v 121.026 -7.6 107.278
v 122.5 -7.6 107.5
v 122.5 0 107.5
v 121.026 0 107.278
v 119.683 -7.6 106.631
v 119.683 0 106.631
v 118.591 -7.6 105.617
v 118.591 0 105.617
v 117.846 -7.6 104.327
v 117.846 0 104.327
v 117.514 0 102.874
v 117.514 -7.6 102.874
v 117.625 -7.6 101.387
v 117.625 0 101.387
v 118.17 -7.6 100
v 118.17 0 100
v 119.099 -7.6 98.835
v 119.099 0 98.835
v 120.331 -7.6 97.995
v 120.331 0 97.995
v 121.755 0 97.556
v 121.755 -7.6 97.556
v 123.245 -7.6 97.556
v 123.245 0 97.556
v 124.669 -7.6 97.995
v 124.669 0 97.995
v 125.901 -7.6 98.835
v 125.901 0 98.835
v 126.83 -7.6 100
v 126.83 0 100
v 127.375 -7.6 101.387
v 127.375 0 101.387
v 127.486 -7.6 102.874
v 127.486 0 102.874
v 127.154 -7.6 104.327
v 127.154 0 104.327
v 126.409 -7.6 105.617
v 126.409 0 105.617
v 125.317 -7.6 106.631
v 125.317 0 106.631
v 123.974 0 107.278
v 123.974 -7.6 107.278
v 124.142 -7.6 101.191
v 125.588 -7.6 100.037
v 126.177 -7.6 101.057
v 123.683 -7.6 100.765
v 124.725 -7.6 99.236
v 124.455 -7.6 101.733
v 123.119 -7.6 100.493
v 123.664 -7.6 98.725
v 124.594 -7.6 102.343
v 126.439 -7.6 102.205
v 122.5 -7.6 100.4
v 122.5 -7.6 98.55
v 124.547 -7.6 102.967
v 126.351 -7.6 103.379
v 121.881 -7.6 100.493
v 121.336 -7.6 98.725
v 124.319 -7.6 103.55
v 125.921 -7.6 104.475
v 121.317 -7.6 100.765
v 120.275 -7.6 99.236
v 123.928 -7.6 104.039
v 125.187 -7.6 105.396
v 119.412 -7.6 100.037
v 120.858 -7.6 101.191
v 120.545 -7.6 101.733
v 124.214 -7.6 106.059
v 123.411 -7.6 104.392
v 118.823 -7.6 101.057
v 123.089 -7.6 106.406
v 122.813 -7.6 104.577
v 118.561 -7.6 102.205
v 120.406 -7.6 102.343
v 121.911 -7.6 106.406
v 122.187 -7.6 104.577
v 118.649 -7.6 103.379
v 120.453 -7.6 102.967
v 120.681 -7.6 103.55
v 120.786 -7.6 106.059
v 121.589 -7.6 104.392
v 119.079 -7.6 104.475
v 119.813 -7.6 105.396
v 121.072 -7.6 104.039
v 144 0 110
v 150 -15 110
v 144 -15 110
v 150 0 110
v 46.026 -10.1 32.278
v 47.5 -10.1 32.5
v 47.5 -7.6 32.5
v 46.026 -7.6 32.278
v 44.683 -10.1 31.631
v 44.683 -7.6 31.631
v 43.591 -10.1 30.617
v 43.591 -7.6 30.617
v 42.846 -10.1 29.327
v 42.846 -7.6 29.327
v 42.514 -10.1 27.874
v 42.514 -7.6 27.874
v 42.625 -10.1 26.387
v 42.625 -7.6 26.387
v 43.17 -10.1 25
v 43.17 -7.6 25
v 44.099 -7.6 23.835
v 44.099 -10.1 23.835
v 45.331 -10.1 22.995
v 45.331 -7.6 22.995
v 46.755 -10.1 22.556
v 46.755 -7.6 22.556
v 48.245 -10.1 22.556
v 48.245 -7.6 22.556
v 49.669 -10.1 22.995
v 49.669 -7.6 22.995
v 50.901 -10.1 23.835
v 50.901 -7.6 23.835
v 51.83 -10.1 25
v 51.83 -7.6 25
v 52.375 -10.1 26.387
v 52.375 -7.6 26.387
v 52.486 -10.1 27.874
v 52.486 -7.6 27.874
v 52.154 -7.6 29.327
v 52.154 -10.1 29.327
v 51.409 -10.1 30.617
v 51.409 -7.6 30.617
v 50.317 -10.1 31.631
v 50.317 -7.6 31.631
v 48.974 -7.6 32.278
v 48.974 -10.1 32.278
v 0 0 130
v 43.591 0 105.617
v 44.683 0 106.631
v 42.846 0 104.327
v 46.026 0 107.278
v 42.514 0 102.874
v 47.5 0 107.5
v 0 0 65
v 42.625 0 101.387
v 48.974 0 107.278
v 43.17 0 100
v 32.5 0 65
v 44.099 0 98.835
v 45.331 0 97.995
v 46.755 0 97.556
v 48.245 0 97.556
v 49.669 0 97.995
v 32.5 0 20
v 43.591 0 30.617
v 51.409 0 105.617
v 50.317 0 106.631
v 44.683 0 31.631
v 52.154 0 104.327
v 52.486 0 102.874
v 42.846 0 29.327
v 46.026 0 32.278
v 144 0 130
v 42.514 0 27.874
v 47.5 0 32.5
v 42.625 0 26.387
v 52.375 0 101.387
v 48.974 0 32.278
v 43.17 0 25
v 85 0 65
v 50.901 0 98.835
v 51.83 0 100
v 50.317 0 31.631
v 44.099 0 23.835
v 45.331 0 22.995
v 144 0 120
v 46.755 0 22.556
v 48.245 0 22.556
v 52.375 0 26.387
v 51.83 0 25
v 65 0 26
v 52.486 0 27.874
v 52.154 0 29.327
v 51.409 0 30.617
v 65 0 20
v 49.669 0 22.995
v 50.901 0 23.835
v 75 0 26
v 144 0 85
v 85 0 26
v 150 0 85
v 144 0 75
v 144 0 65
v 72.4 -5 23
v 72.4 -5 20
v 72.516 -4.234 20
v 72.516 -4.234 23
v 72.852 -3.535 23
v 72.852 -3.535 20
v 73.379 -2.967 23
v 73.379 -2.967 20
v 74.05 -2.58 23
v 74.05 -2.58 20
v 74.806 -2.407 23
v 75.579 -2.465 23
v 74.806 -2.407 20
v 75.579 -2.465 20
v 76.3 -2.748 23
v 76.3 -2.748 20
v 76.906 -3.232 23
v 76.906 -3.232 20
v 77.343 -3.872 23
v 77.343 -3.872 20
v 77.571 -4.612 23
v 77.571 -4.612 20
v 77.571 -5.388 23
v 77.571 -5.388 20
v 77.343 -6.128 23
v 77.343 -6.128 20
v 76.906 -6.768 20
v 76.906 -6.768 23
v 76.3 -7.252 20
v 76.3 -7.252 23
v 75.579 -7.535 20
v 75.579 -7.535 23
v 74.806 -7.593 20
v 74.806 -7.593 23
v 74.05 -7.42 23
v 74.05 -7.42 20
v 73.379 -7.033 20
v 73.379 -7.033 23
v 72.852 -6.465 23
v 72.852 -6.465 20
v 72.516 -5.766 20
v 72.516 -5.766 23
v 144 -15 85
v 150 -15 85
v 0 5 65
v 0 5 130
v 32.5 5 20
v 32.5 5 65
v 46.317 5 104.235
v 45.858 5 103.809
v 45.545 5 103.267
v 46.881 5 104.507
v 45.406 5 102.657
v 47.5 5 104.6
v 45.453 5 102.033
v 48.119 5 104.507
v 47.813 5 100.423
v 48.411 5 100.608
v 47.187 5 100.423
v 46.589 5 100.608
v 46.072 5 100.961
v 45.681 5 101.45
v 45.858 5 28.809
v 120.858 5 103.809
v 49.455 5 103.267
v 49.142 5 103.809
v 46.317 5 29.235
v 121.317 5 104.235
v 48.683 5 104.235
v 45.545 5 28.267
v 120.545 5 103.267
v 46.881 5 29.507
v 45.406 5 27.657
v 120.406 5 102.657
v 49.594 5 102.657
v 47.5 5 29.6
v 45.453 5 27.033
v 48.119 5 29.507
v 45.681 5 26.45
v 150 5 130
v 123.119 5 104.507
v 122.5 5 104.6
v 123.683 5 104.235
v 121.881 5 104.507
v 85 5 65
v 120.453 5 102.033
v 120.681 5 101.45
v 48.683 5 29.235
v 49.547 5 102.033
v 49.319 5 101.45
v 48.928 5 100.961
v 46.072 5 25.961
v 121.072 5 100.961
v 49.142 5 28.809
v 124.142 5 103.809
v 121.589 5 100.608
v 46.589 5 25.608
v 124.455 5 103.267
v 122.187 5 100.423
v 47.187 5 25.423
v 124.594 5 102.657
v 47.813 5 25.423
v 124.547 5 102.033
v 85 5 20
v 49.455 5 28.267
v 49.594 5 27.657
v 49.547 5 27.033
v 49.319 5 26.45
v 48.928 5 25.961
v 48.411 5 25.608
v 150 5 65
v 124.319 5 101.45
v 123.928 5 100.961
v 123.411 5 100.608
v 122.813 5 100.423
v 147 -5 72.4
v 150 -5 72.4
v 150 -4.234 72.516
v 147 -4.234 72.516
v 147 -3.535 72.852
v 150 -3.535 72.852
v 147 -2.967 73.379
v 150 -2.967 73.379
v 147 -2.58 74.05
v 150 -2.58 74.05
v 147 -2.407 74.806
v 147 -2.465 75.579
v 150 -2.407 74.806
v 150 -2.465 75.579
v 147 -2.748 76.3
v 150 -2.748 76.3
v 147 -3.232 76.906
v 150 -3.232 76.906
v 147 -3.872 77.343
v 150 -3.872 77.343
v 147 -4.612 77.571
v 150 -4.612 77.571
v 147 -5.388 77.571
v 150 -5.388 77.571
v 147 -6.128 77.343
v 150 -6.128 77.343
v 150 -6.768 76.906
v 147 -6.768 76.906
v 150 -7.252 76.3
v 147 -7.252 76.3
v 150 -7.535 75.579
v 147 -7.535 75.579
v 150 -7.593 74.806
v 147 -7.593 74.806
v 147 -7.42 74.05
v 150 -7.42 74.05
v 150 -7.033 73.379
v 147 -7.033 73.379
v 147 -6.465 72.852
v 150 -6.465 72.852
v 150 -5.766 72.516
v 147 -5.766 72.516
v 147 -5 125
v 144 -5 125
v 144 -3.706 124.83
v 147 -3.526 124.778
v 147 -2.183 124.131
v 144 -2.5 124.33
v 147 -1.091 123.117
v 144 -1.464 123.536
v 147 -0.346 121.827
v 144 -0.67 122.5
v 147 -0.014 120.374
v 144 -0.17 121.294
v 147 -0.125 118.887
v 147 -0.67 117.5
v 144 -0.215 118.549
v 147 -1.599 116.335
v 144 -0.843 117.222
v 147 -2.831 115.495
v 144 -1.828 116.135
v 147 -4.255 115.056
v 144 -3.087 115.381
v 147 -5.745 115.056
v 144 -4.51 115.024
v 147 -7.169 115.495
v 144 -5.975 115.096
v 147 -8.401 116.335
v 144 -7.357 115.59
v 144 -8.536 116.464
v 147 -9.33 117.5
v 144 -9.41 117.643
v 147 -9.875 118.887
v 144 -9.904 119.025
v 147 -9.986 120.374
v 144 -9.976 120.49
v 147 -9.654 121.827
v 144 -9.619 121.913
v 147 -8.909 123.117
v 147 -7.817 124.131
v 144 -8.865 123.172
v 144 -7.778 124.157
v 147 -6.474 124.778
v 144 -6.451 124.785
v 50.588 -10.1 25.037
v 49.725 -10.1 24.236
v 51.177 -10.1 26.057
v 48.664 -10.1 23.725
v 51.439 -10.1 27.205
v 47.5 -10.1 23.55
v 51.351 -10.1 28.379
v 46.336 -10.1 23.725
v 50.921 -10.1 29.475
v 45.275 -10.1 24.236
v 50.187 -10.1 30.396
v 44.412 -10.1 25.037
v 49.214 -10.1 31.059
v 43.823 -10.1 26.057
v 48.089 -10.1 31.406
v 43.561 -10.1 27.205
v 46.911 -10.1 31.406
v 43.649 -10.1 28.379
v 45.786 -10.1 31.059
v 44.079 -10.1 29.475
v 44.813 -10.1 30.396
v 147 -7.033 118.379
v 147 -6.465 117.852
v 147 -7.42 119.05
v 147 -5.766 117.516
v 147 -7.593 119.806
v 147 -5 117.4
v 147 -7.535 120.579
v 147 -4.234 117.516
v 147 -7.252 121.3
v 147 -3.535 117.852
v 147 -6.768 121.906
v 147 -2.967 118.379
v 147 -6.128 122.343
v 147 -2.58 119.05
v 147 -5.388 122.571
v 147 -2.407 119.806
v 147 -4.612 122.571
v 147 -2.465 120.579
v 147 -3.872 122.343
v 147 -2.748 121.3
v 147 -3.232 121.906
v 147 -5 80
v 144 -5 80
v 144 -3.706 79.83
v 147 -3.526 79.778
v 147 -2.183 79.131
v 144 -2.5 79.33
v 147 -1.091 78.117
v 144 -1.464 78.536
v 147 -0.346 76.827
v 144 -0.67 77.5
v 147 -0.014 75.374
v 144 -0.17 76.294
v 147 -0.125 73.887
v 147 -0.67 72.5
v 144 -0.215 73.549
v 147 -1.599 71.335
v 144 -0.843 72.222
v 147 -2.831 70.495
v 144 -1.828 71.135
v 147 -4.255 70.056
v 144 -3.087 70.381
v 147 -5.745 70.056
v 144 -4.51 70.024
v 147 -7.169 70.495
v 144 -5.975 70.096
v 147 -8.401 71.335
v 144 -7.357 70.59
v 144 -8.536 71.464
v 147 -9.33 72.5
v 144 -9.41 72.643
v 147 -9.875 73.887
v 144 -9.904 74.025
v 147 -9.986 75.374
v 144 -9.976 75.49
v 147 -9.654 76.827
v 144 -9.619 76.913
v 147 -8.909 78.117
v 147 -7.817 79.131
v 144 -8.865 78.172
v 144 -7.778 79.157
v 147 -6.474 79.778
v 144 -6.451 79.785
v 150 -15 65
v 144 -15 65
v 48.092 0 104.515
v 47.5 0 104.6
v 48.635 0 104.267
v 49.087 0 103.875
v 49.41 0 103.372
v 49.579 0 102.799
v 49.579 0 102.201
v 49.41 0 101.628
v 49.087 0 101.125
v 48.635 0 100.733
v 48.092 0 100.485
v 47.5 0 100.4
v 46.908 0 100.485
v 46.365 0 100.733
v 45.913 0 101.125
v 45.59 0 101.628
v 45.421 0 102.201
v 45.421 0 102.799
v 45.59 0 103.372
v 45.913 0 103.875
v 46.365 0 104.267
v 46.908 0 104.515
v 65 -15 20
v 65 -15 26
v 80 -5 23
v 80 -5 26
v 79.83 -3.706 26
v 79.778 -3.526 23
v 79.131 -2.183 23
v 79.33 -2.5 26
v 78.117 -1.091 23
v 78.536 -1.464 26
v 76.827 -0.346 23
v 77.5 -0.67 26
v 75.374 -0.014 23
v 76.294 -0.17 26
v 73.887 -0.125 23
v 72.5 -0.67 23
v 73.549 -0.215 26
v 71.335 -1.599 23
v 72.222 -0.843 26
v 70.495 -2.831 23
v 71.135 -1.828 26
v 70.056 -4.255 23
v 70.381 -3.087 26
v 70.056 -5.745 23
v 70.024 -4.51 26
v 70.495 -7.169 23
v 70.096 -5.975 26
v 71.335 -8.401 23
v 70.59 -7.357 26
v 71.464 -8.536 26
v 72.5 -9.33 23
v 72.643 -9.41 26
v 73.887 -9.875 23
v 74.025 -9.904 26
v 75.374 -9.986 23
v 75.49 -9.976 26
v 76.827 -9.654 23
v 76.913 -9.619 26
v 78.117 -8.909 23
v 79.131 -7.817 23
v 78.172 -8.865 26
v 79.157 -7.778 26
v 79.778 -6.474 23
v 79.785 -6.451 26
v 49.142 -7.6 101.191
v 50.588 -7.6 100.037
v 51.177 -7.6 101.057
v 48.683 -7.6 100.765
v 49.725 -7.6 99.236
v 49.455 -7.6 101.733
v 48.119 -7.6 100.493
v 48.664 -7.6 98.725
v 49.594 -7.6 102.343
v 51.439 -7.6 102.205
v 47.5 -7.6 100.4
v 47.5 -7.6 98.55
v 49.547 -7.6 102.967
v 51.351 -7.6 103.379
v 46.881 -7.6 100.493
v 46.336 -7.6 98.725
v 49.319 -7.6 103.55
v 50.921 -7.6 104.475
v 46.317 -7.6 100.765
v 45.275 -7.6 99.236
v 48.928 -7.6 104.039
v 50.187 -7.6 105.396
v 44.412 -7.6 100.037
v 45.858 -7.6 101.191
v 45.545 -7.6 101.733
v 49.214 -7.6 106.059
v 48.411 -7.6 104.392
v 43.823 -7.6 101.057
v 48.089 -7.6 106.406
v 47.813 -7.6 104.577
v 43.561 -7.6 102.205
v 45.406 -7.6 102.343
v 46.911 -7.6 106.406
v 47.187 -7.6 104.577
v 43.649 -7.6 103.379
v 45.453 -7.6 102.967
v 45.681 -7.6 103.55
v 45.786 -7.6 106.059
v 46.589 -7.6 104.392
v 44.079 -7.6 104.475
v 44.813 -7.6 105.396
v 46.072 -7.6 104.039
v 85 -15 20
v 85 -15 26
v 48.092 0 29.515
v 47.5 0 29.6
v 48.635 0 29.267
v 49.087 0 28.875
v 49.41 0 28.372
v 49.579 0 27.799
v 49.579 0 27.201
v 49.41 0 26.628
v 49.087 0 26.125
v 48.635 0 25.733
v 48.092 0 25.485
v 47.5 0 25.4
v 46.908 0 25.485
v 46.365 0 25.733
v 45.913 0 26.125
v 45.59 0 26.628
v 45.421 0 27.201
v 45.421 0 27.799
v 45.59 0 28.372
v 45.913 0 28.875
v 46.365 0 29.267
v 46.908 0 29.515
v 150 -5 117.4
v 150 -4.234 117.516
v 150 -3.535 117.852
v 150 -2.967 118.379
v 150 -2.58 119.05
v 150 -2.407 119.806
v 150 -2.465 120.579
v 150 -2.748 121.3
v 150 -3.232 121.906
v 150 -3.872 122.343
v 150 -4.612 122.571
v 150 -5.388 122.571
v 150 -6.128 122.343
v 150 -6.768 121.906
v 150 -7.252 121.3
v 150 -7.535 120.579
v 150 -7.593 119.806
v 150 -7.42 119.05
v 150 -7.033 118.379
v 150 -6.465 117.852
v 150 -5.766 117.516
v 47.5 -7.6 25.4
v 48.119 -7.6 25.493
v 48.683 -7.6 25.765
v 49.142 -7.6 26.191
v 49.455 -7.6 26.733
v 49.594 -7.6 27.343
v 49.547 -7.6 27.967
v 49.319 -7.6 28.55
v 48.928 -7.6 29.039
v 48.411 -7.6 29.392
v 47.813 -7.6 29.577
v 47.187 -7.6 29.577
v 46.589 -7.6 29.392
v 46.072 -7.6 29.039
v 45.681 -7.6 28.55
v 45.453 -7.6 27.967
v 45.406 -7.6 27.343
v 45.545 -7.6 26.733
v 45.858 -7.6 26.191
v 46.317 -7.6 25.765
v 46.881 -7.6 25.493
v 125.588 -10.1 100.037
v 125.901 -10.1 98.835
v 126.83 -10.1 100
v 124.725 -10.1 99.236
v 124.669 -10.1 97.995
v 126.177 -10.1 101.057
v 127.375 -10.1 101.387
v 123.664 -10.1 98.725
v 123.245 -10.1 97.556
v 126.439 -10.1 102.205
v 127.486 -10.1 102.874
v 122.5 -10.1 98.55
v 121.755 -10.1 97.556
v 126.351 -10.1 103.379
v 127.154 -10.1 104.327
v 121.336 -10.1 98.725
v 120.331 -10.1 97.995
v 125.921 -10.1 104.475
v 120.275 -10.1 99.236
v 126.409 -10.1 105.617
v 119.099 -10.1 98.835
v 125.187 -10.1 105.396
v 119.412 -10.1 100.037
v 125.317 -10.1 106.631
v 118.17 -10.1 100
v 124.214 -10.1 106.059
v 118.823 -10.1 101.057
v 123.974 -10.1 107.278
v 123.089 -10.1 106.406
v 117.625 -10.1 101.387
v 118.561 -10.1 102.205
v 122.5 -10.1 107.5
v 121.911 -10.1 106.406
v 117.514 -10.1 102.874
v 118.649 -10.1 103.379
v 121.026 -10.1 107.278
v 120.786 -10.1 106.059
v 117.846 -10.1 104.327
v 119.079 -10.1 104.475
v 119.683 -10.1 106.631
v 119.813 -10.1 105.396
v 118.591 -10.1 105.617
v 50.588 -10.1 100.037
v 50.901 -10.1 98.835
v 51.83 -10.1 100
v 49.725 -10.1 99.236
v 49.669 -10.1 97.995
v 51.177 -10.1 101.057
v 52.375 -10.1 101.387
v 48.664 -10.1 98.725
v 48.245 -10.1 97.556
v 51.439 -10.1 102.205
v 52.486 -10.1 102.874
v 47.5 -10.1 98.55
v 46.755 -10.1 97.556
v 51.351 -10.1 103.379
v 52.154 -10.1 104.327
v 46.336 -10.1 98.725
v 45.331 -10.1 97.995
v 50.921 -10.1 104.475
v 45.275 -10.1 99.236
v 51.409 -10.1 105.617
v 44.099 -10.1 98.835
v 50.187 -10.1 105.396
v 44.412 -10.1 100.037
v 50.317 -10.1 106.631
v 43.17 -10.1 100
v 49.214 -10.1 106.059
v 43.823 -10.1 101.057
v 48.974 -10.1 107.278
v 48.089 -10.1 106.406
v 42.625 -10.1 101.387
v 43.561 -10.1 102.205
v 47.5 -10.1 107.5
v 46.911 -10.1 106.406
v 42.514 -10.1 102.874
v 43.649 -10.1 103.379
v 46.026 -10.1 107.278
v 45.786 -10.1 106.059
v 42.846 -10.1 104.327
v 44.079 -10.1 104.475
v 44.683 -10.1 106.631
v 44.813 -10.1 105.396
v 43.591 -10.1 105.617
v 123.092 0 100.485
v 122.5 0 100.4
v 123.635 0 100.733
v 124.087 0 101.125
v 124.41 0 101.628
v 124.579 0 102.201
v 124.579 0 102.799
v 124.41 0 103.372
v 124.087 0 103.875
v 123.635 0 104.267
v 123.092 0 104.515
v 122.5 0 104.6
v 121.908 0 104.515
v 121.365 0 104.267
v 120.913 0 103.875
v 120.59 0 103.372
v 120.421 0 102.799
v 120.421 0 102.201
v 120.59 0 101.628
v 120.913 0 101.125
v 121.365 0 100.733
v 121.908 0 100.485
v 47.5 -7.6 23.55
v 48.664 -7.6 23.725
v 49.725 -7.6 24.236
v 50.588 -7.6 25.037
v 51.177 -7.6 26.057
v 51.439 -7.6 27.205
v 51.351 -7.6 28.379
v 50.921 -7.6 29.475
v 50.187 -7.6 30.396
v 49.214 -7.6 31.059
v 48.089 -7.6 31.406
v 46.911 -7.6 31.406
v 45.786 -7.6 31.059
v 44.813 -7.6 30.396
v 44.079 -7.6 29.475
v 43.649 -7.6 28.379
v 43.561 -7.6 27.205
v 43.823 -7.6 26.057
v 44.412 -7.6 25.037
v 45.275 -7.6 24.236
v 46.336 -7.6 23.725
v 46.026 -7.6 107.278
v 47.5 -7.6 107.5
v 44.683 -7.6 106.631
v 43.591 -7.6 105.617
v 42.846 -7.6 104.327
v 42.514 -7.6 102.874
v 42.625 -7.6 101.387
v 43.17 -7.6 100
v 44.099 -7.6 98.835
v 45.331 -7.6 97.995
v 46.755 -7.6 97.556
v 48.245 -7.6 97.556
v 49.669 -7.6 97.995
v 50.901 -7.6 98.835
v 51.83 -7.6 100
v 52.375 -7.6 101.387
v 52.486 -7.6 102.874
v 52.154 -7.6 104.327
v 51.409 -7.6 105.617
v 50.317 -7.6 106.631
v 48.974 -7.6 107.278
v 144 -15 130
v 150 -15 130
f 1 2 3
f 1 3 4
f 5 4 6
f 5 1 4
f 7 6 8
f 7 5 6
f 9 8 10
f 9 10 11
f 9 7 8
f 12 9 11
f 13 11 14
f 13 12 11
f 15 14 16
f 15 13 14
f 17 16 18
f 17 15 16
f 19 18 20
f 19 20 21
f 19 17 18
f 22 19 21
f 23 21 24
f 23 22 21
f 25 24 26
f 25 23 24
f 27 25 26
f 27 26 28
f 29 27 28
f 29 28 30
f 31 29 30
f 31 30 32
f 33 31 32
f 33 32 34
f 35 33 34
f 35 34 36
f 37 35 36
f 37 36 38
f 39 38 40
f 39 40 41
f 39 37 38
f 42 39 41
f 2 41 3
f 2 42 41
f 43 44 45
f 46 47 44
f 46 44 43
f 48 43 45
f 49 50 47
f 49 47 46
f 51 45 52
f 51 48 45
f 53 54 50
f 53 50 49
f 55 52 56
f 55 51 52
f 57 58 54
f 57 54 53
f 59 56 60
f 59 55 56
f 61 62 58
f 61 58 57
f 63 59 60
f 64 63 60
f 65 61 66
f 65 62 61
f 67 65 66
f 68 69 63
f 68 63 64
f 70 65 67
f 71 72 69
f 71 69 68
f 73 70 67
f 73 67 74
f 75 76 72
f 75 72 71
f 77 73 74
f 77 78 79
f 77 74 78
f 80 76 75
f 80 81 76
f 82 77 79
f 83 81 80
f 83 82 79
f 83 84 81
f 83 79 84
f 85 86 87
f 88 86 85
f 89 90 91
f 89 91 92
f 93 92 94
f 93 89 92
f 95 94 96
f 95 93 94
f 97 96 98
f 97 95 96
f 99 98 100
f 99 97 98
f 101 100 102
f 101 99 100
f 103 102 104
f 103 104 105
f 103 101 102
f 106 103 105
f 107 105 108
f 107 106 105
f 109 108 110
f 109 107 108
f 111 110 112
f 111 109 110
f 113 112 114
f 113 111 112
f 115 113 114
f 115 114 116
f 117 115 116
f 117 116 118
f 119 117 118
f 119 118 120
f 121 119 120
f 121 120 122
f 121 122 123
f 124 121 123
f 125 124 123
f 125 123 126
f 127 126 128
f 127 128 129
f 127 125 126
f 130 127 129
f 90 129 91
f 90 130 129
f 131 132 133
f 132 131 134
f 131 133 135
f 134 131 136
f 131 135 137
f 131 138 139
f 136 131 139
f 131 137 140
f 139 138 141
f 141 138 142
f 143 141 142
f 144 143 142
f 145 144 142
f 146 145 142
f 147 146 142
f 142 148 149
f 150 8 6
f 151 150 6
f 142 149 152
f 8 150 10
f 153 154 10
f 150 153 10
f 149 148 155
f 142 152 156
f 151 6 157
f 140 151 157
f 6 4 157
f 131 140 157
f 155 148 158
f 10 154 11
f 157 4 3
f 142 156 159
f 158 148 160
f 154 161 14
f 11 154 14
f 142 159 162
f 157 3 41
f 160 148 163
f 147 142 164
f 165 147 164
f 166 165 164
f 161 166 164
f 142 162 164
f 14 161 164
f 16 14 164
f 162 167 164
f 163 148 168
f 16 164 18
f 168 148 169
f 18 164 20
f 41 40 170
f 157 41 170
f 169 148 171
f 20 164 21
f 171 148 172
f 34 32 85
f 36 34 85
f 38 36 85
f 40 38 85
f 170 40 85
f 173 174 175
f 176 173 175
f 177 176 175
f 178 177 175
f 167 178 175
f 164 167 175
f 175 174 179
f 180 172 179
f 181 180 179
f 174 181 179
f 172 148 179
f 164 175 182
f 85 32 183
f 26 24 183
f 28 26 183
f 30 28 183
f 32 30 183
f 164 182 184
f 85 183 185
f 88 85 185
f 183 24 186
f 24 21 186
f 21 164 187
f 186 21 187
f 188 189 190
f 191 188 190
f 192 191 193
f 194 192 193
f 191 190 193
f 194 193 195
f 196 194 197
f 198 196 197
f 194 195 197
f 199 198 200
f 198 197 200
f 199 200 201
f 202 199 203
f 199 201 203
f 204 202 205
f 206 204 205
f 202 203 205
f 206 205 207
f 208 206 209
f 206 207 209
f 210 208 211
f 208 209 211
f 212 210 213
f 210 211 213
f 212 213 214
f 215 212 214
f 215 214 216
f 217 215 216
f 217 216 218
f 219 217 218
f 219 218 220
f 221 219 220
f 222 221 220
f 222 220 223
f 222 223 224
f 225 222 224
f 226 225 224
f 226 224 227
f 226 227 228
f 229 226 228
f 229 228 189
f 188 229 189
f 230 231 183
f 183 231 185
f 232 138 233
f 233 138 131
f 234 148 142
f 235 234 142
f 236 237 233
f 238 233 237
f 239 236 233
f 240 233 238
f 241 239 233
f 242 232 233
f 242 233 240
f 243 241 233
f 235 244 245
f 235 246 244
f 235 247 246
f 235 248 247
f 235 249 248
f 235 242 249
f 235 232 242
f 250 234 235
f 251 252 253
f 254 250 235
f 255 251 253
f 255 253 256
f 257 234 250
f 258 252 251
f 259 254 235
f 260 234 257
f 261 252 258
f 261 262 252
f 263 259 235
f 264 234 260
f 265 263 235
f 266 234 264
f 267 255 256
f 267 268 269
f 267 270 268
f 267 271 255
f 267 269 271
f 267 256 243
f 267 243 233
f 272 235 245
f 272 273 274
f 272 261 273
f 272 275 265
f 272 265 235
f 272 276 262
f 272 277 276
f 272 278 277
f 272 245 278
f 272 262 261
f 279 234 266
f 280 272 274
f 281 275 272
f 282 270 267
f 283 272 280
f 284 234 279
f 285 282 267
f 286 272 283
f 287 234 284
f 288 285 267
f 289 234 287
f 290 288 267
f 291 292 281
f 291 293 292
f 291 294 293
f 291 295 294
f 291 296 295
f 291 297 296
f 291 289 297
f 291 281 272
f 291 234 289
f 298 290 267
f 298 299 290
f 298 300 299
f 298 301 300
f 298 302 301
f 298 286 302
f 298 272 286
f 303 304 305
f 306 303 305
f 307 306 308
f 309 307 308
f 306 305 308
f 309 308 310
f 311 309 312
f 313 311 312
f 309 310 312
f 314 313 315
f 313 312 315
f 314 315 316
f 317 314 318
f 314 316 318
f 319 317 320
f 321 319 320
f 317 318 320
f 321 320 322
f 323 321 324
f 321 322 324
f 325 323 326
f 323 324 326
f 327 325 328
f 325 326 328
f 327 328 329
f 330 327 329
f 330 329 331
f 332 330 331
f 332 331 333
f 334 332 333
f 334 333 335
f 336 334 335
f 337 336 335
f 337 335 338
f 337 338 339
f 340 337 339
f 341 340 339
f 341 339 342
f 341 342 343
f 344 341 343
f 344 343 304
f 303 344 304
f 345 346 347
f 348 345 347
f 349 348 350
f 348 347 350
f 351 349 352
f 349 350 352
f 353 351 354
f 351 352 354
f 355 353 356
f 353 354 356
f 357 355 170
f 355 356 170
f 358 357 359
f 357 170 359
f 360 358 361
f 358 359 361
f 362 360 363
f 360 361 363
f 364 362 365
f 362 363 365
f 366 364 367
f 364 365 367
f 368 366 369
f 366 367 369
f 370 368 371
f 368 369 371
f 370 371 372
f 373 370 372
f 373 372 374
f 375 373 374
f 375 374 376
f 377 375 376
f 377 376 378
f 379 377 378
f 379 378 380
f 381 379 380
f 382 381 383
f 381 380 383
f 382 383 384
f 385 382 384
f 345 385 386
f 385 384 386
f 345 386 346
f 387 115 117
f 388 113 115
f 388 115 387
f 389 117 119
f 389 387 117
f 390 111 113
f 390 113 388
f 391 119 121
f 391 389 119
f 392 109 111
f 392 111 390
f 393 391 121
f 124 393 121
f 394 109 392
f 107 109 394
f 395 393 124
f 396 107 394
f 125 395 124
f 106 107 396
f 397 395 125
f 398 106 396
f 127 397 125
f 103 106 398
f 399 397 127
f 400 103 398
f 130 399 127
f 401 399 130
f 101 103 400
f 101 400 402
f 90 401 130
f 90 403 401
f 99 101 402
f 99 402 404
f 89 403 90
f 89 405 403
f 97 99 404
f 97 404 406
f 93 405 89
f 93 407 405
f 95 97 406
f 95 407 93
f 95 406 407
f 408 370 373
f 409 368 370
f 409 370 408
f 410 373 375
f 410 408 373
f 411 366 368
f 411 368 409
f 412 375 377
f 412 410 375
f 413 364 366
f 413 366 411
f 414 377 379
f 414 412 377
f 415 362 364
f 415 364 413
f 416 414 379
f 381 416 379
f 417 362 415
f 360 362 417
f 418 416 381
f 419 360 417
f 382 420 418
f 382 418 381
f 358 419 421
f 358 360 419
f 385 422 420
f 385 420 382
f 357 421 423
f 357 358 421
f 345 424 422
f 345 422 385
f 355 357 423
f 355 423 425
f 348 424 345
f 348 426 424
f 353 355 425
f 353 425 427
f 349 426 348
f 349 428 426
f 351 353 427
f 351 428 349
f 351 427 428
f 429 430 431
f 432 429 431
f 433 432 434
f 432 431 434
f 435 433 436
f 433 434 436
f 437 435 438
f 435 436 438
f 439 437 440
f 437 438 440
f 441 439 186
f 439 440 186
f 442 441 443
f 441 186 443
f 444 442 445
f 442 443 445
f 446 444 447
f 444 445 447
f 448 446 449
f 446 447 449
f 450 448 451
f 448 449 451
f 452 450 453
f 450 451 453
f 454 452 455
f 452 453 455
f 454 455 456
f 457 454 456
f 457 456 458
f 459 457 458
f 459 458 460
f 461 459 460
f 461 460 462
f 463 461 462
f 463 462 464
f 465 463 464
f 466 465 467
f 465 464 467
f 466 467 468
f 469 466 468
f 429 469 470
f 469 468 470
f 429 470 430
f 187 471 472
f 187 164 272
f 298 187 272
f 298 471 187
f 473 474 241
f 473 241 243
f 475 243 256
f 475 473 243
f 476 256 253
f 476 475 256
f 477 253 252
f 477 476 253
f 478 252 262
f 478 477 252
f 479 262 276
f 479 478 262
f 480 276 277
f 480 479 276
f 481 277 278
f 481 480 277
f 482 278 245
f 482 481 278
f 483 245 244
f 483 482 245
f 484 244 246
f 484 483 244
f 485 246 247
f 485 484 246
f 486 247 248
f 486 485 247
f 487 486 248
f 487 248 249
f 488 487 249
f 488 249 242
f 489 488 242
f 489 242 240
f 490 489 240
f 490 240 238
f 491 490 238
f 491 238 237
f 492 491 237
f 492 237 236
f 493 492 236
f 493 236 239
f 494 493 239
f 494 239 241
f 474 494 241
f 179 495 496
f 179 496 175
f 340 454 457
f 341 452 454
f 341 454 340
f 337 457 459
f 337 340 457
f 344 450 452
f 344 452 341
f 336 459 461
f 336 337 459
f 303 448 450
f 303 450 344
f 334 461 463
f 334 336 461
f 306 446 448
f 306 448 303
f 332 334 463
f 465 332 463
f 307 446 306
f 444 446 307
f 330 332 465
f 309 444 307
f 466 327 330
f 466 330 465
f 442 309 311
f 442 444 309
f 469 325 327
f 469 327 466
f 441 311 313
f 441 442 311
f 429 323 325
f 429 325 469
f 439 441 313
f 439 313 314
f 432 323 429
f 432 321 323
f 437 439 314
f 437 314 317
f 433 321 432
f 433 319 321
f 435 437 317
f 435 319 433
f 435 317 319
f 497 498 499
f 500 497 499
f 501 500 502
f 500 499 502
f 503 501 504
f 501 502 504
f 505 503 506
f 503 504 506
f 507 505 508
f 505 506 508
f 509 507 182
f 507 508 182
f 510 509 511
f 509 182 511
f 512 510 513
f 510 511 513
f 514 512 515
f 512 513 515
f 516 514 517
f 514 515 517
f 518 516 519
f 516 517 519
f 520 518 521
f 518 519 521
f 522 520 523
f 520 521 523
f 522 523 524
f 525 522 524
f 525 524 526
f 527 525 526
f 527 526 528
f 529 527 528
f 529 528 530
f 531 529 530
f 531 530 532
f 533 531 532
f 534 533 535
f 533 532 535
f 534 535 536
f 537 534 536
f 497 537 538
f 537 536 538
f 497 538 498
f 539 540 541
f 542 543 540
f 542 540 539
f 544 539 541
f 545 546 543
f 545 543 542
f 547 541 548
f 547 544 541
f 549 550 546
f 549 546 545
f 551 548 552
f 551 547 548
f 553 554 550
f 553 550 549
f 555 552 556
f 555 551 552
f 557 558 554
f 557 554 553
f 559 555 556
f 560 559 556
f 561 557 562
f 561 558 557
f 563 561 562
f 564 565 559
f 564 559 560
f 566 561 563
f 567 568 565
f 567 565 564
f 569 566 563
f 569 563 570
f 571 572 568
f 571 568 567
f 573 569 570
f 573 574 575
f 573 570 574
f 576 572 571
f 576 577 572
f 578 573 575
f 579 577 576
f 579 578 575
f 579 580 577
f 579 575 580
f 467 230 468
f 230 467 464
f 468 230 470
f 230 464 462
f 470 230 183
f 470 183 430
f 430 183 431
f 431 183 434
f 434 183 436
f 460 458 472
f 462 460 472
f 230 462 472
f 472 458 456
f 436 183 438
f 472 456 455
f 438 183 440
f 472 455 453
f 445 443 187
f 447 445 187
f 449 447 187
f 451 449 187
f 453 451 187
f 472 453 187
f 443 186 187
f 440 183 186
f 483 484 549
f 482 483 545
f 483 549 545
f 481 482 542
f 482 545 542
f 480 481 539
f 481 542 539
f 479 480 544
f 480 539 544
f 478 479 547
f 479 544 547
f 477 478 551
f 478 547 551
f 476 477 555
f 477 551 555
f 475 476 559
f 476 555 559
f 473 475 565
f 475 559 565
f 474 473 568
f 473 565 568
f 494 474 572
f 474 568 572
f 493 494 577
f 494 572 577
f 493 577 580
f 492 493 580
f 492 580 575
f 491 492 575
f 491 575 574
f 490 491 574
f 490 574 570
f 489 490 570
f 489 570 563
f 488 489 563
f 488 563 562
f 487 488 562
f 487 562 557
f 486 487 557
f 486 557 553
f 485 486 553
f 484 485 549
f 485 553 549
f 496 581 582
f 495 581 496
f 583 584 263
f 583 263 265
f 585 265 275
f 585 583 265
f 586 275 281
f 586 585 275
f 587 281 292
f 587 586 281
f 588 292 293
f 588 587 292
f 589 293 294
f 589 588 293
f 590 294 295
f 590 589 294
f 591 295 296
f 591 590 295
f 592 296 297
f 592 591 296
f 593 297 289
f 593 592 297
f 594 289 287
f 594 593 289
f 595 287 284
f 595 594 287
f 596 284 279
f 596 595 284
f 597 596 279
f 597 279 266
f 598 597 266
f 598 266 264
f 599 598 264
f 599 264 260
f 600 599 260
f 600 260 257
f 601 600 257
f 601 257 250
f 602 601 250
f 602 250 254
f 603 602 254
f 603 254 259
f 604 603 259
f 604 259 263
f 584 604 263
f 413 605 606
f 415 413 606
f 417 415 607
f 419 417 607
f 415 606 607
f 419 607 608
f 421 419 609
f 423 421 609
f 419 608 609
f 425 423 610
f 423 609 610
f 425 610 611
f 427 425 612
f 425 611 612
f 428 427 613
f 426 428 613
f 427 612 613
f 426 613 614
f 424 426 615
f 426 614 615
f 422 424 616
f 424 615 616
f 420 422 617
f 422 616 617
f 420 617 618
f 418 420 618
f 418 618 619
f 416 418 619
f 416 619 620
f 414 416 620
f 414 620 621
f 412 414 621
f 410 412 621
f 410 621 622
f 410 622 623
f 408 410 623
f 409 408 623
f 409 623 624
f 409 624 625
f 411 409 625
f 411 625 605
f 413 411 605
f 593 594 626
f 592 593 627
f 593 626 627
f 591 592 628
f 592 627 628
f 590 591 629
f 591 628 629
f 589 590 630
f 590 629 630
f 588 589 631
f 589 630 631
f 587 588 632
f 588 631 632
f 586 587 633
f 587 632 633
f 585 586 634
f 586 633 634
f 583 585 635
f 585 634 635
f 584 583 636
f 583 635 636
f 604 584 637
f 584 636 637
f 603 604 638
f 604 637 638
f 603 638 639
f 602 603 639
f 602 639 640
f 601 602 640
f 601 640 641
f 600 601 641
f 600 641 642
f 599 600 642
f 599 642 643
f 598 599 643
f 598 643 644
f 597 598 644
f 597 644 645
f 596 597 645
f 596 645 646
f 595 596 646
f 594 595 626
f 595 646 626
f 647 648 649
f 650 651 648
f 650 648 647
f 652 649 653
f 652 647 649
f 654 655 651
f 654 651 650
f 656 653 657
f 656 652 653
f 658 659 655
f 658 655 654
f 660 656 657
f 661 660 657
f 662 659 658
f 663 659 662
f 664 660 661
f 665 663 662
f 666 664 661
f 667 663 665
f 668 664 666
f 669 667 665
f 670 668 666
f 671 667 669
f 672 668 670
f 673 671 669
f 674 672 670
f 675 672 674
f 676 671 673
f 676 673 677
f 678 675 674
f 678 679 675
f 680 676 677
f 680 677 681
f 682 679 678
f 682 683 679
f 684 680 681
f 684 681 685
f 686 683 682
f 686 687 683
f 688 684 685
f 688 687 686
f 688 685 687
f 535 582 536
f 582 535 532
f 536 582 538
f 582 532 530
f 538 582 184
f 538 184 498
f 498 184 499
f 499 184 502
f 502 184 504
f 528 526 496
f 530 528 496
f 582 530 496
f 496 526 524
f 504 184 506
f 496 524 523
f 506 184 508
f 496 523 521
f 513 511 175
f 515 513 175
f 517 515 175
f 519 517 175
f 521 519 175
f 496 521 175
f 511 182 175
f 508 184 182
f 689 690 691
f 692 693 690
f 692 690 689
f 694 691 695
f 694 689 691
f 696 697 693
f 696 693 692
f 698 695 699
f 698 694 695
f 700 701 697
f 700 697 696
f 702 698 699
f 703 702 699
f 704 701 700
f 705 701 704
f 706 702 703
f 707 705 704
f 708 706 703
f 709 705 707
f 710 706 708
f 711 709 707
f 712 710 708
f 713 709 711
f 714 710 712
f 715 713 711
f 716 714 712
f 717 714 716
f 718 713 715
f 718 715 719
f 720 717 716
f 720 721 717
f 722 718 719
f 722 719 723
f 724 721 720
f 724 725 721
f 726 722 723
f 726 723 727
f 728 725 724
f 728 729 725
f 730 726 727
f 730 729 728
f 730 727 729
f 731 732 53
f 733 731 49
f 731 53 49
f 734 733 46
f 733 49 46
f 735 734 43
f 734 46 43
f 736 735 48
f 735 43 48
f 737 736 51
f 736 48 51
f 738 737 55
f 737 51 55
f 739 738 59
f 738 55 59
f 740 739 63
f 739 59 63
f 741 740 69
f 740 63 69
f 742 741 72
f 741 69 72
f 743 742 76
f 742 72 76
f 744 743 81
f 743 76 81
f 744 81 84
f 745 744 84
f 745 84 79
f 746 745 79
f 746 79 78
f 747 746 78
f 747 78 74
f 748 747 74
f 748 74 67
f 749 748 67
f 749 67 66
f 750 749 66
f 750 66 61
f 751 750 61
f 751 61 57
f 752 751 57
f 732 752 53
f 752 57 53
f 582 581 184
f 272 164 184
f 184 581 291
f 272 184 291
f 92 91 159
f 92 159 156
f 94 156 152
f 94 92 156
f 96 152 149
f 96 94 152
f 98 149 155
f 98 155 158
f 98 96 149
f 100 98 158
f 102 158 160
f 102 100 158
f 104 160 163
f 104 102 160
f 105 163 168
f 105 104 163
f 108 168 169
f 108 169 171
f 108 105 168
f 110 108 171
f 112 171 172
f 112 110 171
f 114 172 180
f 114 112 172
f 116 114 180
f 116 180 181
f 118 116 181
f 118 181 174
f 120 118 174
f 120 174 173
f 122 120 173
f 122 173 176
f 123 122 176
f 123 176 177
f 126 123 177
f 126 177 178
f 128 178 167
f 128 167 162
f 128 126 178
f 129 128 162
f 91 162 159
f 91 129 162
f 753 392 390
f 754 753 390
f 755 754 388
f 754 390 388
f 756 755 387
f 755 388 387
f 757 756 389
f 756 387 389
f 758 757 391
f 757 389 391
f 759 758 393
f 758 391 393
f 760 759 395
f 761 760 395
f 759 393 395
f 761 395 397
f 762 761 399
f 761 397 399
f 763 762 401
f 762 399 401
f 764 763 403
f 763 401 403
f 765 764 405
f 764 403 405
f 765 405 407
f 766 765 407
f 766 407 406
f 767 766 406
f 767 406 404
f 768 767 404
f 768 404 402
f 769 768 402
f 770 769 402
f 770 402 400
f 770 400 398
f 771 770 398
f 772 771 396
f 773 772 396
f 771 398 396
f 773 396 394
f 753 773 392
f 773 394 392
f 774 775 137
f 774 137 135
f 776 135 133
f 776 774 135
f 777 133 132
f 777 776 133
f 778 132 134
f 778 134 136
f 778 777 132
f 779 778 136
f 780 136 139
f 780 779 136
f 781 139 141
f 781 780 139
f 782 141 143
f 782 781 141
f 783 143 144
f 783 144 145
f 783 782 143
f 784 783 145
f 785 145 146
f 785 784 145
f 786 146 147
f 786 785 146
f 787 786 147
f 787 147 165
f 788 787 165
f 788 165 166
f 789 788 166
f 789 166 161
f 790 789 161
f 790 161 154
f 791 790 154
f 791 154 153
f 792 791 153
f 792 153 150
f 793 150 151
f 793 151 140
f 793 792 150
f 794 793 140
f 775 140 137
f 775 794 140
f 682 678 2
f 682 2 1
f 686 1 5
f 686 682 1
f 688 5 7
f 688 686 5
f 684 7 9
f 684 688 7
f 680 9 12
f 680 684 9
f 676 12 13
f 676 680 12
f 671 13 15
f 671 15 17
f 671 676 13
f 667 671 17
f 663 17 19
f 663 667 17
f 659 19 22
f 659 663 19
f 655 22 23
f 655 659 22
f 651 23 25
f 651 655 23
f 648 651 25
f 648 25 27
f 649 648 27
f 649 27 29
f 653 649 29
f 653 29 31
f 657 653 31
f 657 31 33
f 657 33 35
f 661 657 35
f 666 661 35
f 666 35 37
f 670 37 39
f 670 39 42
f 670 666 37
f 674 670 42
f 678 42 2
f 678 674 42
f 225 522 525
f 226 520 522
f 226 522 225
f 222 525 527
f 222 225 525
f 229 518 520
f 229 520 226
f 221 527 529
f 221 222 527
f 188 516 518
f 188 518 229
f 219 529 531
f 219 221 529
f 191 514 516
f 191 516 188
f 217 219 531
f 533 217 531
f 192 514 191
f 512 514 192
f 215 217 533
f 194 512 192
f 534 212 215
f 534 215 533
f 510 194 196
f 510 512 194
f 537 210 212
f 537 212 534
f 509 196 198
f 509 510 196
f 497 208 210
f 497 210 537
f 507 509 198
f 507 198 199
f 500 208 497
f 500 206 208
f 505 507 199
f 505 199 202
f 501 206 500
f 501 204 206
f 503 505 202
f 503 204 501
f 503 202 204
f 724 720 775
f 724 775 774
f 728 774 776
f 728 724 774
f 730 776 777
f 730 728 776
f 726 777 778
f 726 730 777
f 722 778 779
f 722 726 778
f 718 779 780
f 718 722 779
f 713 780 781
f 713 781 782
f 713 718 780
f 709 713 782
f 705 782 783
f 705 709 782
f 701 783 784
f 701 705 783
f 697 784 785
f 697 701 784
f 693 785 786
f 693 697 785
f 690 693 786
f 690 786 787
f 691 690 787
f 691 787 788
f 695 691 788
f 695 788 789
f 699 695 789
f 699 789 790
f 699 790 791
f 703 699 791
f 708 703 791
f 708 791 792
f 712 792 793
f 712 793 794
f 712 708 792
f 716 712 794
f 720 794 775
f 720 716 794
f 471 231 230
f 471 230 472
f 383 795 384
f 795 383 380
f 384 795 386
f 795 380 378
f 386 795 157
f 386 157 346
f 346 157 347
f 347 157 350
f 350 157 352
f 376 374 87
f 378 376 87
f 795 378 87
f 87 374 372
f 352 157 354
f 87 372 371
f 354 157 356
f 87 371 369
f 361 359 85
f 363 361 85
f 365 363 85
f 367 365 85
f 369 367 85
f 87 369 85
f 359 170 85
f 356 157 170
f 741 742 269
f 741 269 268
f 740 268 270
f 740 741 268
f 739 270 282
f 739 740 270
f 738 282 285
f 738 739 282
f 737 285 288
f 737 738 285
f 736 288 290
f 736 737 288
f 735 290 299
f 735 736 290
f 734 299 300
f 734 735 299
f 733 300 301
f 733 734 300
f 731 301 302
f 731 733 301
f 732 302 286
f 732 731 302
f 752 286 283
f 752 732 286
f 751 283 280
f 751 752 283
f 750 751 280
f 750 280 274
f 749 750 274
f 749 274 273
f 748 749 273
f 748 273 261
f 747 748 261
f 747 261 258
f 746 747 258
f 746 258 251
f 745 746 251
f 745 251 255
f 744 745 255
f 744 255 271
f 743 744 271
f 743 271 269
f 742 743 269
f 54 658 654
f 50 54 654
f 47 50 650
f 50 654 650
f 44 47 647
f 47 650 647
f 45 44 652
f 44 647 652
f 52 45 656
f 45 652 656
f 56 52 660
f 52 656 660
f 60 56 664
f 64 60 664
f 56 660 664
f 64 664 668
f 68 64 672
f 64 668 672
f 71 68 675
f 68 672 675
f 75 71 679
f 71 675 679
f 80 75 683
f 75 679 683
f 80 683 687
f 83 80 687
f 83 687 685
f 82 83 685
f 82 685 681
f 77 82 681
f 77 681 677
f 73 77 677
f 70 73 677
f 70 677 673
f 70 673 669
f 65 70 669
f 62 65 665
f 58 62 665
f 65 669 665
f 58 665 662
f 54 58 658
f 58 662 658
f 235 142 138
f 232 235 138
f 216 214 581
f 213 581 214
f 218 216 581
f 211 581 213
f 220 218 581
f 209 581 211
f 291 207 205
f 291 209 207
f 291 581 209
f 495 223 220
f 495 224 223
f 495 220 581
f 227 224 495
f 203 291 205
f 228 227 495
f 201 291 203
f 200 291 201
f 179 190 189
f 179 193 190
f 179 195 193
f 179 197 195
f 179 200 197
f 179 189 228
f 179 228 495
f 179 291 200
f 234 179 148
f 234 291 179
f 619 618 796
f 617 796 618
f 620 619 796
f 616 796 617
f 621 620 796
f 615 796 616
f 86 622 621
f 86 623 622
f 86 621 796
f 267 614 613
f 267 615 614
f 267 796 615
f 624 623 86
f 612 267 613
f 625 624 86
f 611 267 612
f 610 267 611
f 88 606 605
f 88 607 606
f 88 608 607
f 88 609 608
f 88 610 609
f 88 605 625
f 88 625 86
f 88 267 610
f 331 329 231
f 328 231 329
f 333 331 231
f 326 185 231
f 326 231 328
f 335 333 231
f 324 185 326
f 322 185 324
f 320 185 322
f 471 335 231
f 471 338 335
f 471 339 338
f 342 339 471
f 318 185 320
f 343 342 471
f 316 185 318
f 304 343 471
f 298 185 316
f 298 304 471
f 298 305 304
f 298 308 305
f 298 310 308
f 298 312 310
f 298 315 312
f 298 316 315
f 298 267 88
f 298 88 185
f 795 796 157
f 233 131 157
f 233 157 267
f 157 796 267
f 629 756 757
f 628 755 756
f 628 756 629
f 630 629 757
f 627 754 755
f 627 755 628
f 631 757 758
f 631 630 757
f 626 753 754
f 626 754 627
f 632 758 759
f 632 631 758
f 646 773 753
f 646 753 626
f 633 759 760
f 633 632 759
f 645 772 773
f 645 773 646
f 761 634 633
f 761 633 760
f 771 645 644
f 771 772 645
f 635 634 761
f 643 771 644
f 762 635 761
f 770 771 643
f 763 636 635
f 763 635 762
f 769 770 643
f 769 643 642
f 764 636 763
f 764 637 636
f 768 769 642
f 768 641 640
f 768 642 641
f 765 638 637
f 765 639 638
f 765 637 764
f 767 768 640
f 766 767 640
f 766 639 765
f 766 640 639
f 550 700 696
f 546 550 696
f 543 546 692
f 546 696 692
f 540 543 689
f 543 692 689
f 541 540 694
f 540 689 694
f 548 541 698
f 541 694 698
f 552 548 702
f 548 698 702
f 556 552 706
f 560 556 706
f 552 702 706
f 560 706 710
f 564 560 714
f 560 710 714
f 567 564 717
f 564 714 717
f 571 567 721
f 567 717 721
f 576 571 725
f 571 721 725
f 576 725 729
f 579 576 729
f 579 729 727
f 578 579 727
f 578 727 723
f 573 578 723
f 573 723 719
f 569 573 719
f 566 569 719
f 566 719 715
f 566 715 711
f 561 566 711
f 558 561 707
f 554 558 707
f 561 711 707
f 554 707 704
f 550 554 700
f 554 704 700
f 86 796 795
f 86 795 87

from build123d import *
from build123d.topology import SkipClean

# Parameters (mm, degrees)
SKETCH_1_R          = 2.1
EXTRUDE_1_DEPTH     = 5
SKETCH_2_W          = 20
SKETCH_2_H          = 20
SKETCH_2_R          = 2.6
EXTRUDE_2_DEPTH     = 6
SKETCH_3_R          = 5
CUT_EXTRUDE_1_DEPTH = 3
SKETCH_5_W          = 20
SKETCH_5_H          = 20
SKETCH_5_R          = 2.6
EXTRUDE_3_DEPTH     = 6
SKETCH_6_R          = 5
CUT_EXTRUDE_2_DEPTH = 3
SKETCH_7_W          = 20
SKETCH_7_H          = 20
SKETCH_7_R          = 2.6
EXTRUDE_4_DEPTH     = 6
SKETCH_8_R          = 5
CUT_EXTRUDE_3_DEPTH = 3
EXTRUDE_START       = 7.6
SKETCH_9_R          = 5
SKETCH_9_R_2        = 2.1
EXTRUDE_5_DEPTH     = 7.6
EXTRUDE_START_2     = 2.5
SKETCH_10_R         = 5
SKETCH_10_R_2       = 3.95
EXTRUDE_6_DEPTH     = 2.5


with BuildPart() as part:
    # 草图1 → 凸台-拉伸1 (new body)
    with BuildSketch(Plane(origin=(0, 0, 0), x_dir=(1, 0, 0), z_dir=(0, 1, 0))):
        Polygon((0, -65), (0, -130), (150, -130), (150, -65), (85, -65), (85, -20), (32.5, -20), (32.5, -65), align=None)
        with Locations(Location((47.5, -27.5, 0), (0, 0, 270))):
            Circle(SKETCH_1_R, mode=Mode.SUBTRACT)
        with Locations(Location((47.5, -102.5, 0), (0, 0, 270))):
            Circle(SKETCH_1_R, mode=Mode.SUBTRACT)
        with Locations(Location((122.5, -102.5, 0), (0, 0, 270))):
            Circle(SKETCH_1_R, mode=Mode.SUBTRACT)
    extrude(amount=EXTRUDE_1_DEPTH)

    # 草图2 → 凸台-拉伸2 (add)
    with BuildSketch(Plane(origin=(150, 0, 0), x_dir=(0, 0, -1), z_dir=(1, 0, 0))):
        with Locations((-75, -5)):
            Rectangle(SKETCH_2_W, SKETCH_2_H)
        with Locations((-75, -5)):
            Circle(SKETCH_2_R, mode=Mode.SUBTRACT)
    extrude(amount=-EXTRUDE_2_DEPTH)

    # 草图3 → 切除-拉伸1 (cut)
    with BuildSketch(Plane.ZY.offset(-144)):
        with Locations((75, -5)):
            Circle(SKETCH_3_R)
    extrude(amount=-CUT_EXTRUDE_1_DEPTH, mode=Mode.SUBTRACT)

    # 草图5 → 凸台-拉伸3 (add)
    with BuildSketch(Plane(origin=(0, 0, 20), x_dir=(-1, 0, 0), z_dir=(0, 0, -1))):
        with Locations((-75, -5)):
            Rectangle(SKETCH_5_W, SKETCH_5_H)
        with Locations((-75, -5)):
            Circle(SKETCH_5_R, mode=Mode.SUBTRACT)
    extrude(amount=-EXTRUDE_3_DEPTH)

    # 草图6 → 切除-拉伸2 (cut)
    with BuildSketch(Plane.XY.offset(26)):
        with Locations((75, -5)):
            Circle(SKETCH_6_R)
    extrude(amount=-CUT_EXTRUDE_2_DEPTH, mode=Mode.SUBTRACT)

    # 草图7 → 凸台-拉伸4 (add)
    with BuildSketch(Plane(origin=(150, 0, 0), x_dir=(0, 0, -1), z_dir=(1, 0, 0))):
        with Locations((-120, -5)):
            Rectangle(SKETCH_7_W, SKETCH_7_H)
        with Locations((-120, -5)):
            Circle(SKETCH_7_R, mode=Mode.SUBTRACT)
    extrude(amount=-EXTRUDE_4_DEPTH)

    # 草图8 → 切除-拉伸3 (cut)
    with BuildSketch(Plane.ZY.offset(-144)):
        with Locations((120, -5)):
            Circle(SKETCH_8_R)
    extrude(amount=-CUT_EXTRUDE_3_DEPTH, mode=Mode.SUBTRACT)

    # 草图9 → 凸台-拉伸5 (add)
    # profile 1 of 3: a face of its own
    with SkipClean():  # the faces are left unmerged after this step: merging them gives an invalid solid
        with BuildSketch(Plane.XZ.offset(EXTRUDE_START)):
            with Locations(Location((47.5, 102.5, 0), (0, 0, 90))):
                Circle(SKETCH_9_R)
            with Locations(Location((47.5, 102.5, 0), (0, 0, 270))):
                Circle(SKETCH_9_R_2, mode=Mode.SUBTRACT)
        # profile 2 of 3: a face of its own
        with BuildSketch(Plane.XZ.offset(EXTRUDE_START)):
            with Locations(Location((122.5, 102.5, 0), (0, 0, 90))):
                Circle(SKETCH_9_R)
            with Locations(Location((122.5, 102.5, 0), (0, 0, 270))):
                Circle(SKETCH_9_R_2, mode=Mode.SUBTRACT)
        # profile 3 of 3: a face of its own
        with BuildSketch(Plane.XZ.offset(EXTRUDE_START)):
            with Locations(Location((47.5, 27.5, 0), (0, 0, 90))):
                Circle(SKETCH_9_R)
            with Locations(Location((47.5, 27.5, 0), (0, 0, 270))):
                Circle(SKETCH_9_R_2, mode=Mode.SUBTRACT)
        extrude(amount=-EXTRUDE_5_DEPTH)

    # 草图10 → 凸台-拉伸6 (add)
    # profile 1 of 3: a face of its own
    with SkipClean():  # the faces are left unmerged after this step: merging them gives an invalid solid
        with BuildSketch(Plane.XZ.offset(7.6).offset(EXTRUDE_START_2)):
            with Locations(Location((47.5, 102.5, 0), (0, 0, 90))):
                Circle(SKETCH_10_R)
            with Locations(Location((47.5, 102.5, 0), (0, 0, 270))):
                Circle(SKETCH_10_R_2, mode=Mode.SUBTRACT)
        # profile 2 of 3: a face of its own
        with BuildSketch(Plane.XZ.offset(7.6).offset(EXTRUDE_START_2)):
            with Locations(Location((47.5, 27.5, 0), (0, 0, 90))):
                Circle(SKETCH_10_R)
            with Locations(Location((47.5, 27.5, 0), (0, 0, 270))):
                Circle(SKETCH_10_R_2, mode=Mode.SUBTRACT)
        # profile 3 of 3: a face of its own
        with BuildSketch(Plane.XZ.offset(7.6).offset(EXTRUDE_START_2)):
            with Locations(Location((122.5, 102.5, 0), (0, 0, 90))):
                Circle(SKETCH_10_R)
            with Locations(Location((122.5, 102.5, 0), (0, 0, 270))):
                Circle(SKETCH_10_R_2, mode=Mode.SUBTRACT)
        extrude(amount=-EXTRUDE_6_DEPTH)


solid = part.part
